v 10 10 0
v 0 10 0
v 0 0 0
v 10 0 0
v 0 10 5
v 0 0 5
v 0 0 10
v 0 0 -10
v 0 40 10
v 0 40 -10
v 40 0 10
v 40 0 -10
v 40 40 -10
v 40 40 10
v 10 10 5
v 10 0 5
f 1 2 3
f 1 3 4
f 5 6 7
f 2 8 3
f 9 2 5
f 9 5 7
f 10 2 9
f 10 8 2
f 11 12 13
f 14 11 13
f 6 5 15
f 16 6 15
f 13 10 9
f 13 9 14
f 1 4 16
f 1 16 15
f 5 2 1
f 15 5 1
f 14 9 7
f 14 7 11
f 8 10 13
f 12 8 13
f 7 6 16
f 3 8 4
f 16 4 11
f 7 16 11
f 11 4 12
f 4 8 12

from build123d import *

# Parameters (mm, degrees)
BOSS_EXTRUDE1_DEPTH      = 10
BOSS_EXTRUDE1_DEPTH_BACK = 10
SKETCH1_W                = 40
SKETCH1_H                = 40
SKETCH2_W                = 10
SKETCH2_H                = 10
CUT_EXTRUDE1_DEPTH       = 5


with BuildPart() as part:
    # Sketch1 → Boss-Extrude1 (new, two sides: drawn at the far end of the back side and taken through both)
    with BuildSketch(Plane.XY.offset(-BOSS_EXTRUDE1_DEPTH_BACK)):
        with Locations((20, 20)):
            Rectangle(SKETCH1_W, SKETCH1_H)
    extrude(amount=BOSS_EXTRUDE1_DEPTH + BOSS_EXTRUDE1_DEPTH_BACK)

    # Sketch2 → Cut-Extrude1 (cut)
    with BuildSketch(Plane.XY):
        with Locations((5, 5)):
            Rectangle(SKETCH2_W, SKETCH2_H)
    extrude(amount=CUT_EXTRUDE1_DEPTH, mode=Mode.SUBTRACT)


solid = part.part
